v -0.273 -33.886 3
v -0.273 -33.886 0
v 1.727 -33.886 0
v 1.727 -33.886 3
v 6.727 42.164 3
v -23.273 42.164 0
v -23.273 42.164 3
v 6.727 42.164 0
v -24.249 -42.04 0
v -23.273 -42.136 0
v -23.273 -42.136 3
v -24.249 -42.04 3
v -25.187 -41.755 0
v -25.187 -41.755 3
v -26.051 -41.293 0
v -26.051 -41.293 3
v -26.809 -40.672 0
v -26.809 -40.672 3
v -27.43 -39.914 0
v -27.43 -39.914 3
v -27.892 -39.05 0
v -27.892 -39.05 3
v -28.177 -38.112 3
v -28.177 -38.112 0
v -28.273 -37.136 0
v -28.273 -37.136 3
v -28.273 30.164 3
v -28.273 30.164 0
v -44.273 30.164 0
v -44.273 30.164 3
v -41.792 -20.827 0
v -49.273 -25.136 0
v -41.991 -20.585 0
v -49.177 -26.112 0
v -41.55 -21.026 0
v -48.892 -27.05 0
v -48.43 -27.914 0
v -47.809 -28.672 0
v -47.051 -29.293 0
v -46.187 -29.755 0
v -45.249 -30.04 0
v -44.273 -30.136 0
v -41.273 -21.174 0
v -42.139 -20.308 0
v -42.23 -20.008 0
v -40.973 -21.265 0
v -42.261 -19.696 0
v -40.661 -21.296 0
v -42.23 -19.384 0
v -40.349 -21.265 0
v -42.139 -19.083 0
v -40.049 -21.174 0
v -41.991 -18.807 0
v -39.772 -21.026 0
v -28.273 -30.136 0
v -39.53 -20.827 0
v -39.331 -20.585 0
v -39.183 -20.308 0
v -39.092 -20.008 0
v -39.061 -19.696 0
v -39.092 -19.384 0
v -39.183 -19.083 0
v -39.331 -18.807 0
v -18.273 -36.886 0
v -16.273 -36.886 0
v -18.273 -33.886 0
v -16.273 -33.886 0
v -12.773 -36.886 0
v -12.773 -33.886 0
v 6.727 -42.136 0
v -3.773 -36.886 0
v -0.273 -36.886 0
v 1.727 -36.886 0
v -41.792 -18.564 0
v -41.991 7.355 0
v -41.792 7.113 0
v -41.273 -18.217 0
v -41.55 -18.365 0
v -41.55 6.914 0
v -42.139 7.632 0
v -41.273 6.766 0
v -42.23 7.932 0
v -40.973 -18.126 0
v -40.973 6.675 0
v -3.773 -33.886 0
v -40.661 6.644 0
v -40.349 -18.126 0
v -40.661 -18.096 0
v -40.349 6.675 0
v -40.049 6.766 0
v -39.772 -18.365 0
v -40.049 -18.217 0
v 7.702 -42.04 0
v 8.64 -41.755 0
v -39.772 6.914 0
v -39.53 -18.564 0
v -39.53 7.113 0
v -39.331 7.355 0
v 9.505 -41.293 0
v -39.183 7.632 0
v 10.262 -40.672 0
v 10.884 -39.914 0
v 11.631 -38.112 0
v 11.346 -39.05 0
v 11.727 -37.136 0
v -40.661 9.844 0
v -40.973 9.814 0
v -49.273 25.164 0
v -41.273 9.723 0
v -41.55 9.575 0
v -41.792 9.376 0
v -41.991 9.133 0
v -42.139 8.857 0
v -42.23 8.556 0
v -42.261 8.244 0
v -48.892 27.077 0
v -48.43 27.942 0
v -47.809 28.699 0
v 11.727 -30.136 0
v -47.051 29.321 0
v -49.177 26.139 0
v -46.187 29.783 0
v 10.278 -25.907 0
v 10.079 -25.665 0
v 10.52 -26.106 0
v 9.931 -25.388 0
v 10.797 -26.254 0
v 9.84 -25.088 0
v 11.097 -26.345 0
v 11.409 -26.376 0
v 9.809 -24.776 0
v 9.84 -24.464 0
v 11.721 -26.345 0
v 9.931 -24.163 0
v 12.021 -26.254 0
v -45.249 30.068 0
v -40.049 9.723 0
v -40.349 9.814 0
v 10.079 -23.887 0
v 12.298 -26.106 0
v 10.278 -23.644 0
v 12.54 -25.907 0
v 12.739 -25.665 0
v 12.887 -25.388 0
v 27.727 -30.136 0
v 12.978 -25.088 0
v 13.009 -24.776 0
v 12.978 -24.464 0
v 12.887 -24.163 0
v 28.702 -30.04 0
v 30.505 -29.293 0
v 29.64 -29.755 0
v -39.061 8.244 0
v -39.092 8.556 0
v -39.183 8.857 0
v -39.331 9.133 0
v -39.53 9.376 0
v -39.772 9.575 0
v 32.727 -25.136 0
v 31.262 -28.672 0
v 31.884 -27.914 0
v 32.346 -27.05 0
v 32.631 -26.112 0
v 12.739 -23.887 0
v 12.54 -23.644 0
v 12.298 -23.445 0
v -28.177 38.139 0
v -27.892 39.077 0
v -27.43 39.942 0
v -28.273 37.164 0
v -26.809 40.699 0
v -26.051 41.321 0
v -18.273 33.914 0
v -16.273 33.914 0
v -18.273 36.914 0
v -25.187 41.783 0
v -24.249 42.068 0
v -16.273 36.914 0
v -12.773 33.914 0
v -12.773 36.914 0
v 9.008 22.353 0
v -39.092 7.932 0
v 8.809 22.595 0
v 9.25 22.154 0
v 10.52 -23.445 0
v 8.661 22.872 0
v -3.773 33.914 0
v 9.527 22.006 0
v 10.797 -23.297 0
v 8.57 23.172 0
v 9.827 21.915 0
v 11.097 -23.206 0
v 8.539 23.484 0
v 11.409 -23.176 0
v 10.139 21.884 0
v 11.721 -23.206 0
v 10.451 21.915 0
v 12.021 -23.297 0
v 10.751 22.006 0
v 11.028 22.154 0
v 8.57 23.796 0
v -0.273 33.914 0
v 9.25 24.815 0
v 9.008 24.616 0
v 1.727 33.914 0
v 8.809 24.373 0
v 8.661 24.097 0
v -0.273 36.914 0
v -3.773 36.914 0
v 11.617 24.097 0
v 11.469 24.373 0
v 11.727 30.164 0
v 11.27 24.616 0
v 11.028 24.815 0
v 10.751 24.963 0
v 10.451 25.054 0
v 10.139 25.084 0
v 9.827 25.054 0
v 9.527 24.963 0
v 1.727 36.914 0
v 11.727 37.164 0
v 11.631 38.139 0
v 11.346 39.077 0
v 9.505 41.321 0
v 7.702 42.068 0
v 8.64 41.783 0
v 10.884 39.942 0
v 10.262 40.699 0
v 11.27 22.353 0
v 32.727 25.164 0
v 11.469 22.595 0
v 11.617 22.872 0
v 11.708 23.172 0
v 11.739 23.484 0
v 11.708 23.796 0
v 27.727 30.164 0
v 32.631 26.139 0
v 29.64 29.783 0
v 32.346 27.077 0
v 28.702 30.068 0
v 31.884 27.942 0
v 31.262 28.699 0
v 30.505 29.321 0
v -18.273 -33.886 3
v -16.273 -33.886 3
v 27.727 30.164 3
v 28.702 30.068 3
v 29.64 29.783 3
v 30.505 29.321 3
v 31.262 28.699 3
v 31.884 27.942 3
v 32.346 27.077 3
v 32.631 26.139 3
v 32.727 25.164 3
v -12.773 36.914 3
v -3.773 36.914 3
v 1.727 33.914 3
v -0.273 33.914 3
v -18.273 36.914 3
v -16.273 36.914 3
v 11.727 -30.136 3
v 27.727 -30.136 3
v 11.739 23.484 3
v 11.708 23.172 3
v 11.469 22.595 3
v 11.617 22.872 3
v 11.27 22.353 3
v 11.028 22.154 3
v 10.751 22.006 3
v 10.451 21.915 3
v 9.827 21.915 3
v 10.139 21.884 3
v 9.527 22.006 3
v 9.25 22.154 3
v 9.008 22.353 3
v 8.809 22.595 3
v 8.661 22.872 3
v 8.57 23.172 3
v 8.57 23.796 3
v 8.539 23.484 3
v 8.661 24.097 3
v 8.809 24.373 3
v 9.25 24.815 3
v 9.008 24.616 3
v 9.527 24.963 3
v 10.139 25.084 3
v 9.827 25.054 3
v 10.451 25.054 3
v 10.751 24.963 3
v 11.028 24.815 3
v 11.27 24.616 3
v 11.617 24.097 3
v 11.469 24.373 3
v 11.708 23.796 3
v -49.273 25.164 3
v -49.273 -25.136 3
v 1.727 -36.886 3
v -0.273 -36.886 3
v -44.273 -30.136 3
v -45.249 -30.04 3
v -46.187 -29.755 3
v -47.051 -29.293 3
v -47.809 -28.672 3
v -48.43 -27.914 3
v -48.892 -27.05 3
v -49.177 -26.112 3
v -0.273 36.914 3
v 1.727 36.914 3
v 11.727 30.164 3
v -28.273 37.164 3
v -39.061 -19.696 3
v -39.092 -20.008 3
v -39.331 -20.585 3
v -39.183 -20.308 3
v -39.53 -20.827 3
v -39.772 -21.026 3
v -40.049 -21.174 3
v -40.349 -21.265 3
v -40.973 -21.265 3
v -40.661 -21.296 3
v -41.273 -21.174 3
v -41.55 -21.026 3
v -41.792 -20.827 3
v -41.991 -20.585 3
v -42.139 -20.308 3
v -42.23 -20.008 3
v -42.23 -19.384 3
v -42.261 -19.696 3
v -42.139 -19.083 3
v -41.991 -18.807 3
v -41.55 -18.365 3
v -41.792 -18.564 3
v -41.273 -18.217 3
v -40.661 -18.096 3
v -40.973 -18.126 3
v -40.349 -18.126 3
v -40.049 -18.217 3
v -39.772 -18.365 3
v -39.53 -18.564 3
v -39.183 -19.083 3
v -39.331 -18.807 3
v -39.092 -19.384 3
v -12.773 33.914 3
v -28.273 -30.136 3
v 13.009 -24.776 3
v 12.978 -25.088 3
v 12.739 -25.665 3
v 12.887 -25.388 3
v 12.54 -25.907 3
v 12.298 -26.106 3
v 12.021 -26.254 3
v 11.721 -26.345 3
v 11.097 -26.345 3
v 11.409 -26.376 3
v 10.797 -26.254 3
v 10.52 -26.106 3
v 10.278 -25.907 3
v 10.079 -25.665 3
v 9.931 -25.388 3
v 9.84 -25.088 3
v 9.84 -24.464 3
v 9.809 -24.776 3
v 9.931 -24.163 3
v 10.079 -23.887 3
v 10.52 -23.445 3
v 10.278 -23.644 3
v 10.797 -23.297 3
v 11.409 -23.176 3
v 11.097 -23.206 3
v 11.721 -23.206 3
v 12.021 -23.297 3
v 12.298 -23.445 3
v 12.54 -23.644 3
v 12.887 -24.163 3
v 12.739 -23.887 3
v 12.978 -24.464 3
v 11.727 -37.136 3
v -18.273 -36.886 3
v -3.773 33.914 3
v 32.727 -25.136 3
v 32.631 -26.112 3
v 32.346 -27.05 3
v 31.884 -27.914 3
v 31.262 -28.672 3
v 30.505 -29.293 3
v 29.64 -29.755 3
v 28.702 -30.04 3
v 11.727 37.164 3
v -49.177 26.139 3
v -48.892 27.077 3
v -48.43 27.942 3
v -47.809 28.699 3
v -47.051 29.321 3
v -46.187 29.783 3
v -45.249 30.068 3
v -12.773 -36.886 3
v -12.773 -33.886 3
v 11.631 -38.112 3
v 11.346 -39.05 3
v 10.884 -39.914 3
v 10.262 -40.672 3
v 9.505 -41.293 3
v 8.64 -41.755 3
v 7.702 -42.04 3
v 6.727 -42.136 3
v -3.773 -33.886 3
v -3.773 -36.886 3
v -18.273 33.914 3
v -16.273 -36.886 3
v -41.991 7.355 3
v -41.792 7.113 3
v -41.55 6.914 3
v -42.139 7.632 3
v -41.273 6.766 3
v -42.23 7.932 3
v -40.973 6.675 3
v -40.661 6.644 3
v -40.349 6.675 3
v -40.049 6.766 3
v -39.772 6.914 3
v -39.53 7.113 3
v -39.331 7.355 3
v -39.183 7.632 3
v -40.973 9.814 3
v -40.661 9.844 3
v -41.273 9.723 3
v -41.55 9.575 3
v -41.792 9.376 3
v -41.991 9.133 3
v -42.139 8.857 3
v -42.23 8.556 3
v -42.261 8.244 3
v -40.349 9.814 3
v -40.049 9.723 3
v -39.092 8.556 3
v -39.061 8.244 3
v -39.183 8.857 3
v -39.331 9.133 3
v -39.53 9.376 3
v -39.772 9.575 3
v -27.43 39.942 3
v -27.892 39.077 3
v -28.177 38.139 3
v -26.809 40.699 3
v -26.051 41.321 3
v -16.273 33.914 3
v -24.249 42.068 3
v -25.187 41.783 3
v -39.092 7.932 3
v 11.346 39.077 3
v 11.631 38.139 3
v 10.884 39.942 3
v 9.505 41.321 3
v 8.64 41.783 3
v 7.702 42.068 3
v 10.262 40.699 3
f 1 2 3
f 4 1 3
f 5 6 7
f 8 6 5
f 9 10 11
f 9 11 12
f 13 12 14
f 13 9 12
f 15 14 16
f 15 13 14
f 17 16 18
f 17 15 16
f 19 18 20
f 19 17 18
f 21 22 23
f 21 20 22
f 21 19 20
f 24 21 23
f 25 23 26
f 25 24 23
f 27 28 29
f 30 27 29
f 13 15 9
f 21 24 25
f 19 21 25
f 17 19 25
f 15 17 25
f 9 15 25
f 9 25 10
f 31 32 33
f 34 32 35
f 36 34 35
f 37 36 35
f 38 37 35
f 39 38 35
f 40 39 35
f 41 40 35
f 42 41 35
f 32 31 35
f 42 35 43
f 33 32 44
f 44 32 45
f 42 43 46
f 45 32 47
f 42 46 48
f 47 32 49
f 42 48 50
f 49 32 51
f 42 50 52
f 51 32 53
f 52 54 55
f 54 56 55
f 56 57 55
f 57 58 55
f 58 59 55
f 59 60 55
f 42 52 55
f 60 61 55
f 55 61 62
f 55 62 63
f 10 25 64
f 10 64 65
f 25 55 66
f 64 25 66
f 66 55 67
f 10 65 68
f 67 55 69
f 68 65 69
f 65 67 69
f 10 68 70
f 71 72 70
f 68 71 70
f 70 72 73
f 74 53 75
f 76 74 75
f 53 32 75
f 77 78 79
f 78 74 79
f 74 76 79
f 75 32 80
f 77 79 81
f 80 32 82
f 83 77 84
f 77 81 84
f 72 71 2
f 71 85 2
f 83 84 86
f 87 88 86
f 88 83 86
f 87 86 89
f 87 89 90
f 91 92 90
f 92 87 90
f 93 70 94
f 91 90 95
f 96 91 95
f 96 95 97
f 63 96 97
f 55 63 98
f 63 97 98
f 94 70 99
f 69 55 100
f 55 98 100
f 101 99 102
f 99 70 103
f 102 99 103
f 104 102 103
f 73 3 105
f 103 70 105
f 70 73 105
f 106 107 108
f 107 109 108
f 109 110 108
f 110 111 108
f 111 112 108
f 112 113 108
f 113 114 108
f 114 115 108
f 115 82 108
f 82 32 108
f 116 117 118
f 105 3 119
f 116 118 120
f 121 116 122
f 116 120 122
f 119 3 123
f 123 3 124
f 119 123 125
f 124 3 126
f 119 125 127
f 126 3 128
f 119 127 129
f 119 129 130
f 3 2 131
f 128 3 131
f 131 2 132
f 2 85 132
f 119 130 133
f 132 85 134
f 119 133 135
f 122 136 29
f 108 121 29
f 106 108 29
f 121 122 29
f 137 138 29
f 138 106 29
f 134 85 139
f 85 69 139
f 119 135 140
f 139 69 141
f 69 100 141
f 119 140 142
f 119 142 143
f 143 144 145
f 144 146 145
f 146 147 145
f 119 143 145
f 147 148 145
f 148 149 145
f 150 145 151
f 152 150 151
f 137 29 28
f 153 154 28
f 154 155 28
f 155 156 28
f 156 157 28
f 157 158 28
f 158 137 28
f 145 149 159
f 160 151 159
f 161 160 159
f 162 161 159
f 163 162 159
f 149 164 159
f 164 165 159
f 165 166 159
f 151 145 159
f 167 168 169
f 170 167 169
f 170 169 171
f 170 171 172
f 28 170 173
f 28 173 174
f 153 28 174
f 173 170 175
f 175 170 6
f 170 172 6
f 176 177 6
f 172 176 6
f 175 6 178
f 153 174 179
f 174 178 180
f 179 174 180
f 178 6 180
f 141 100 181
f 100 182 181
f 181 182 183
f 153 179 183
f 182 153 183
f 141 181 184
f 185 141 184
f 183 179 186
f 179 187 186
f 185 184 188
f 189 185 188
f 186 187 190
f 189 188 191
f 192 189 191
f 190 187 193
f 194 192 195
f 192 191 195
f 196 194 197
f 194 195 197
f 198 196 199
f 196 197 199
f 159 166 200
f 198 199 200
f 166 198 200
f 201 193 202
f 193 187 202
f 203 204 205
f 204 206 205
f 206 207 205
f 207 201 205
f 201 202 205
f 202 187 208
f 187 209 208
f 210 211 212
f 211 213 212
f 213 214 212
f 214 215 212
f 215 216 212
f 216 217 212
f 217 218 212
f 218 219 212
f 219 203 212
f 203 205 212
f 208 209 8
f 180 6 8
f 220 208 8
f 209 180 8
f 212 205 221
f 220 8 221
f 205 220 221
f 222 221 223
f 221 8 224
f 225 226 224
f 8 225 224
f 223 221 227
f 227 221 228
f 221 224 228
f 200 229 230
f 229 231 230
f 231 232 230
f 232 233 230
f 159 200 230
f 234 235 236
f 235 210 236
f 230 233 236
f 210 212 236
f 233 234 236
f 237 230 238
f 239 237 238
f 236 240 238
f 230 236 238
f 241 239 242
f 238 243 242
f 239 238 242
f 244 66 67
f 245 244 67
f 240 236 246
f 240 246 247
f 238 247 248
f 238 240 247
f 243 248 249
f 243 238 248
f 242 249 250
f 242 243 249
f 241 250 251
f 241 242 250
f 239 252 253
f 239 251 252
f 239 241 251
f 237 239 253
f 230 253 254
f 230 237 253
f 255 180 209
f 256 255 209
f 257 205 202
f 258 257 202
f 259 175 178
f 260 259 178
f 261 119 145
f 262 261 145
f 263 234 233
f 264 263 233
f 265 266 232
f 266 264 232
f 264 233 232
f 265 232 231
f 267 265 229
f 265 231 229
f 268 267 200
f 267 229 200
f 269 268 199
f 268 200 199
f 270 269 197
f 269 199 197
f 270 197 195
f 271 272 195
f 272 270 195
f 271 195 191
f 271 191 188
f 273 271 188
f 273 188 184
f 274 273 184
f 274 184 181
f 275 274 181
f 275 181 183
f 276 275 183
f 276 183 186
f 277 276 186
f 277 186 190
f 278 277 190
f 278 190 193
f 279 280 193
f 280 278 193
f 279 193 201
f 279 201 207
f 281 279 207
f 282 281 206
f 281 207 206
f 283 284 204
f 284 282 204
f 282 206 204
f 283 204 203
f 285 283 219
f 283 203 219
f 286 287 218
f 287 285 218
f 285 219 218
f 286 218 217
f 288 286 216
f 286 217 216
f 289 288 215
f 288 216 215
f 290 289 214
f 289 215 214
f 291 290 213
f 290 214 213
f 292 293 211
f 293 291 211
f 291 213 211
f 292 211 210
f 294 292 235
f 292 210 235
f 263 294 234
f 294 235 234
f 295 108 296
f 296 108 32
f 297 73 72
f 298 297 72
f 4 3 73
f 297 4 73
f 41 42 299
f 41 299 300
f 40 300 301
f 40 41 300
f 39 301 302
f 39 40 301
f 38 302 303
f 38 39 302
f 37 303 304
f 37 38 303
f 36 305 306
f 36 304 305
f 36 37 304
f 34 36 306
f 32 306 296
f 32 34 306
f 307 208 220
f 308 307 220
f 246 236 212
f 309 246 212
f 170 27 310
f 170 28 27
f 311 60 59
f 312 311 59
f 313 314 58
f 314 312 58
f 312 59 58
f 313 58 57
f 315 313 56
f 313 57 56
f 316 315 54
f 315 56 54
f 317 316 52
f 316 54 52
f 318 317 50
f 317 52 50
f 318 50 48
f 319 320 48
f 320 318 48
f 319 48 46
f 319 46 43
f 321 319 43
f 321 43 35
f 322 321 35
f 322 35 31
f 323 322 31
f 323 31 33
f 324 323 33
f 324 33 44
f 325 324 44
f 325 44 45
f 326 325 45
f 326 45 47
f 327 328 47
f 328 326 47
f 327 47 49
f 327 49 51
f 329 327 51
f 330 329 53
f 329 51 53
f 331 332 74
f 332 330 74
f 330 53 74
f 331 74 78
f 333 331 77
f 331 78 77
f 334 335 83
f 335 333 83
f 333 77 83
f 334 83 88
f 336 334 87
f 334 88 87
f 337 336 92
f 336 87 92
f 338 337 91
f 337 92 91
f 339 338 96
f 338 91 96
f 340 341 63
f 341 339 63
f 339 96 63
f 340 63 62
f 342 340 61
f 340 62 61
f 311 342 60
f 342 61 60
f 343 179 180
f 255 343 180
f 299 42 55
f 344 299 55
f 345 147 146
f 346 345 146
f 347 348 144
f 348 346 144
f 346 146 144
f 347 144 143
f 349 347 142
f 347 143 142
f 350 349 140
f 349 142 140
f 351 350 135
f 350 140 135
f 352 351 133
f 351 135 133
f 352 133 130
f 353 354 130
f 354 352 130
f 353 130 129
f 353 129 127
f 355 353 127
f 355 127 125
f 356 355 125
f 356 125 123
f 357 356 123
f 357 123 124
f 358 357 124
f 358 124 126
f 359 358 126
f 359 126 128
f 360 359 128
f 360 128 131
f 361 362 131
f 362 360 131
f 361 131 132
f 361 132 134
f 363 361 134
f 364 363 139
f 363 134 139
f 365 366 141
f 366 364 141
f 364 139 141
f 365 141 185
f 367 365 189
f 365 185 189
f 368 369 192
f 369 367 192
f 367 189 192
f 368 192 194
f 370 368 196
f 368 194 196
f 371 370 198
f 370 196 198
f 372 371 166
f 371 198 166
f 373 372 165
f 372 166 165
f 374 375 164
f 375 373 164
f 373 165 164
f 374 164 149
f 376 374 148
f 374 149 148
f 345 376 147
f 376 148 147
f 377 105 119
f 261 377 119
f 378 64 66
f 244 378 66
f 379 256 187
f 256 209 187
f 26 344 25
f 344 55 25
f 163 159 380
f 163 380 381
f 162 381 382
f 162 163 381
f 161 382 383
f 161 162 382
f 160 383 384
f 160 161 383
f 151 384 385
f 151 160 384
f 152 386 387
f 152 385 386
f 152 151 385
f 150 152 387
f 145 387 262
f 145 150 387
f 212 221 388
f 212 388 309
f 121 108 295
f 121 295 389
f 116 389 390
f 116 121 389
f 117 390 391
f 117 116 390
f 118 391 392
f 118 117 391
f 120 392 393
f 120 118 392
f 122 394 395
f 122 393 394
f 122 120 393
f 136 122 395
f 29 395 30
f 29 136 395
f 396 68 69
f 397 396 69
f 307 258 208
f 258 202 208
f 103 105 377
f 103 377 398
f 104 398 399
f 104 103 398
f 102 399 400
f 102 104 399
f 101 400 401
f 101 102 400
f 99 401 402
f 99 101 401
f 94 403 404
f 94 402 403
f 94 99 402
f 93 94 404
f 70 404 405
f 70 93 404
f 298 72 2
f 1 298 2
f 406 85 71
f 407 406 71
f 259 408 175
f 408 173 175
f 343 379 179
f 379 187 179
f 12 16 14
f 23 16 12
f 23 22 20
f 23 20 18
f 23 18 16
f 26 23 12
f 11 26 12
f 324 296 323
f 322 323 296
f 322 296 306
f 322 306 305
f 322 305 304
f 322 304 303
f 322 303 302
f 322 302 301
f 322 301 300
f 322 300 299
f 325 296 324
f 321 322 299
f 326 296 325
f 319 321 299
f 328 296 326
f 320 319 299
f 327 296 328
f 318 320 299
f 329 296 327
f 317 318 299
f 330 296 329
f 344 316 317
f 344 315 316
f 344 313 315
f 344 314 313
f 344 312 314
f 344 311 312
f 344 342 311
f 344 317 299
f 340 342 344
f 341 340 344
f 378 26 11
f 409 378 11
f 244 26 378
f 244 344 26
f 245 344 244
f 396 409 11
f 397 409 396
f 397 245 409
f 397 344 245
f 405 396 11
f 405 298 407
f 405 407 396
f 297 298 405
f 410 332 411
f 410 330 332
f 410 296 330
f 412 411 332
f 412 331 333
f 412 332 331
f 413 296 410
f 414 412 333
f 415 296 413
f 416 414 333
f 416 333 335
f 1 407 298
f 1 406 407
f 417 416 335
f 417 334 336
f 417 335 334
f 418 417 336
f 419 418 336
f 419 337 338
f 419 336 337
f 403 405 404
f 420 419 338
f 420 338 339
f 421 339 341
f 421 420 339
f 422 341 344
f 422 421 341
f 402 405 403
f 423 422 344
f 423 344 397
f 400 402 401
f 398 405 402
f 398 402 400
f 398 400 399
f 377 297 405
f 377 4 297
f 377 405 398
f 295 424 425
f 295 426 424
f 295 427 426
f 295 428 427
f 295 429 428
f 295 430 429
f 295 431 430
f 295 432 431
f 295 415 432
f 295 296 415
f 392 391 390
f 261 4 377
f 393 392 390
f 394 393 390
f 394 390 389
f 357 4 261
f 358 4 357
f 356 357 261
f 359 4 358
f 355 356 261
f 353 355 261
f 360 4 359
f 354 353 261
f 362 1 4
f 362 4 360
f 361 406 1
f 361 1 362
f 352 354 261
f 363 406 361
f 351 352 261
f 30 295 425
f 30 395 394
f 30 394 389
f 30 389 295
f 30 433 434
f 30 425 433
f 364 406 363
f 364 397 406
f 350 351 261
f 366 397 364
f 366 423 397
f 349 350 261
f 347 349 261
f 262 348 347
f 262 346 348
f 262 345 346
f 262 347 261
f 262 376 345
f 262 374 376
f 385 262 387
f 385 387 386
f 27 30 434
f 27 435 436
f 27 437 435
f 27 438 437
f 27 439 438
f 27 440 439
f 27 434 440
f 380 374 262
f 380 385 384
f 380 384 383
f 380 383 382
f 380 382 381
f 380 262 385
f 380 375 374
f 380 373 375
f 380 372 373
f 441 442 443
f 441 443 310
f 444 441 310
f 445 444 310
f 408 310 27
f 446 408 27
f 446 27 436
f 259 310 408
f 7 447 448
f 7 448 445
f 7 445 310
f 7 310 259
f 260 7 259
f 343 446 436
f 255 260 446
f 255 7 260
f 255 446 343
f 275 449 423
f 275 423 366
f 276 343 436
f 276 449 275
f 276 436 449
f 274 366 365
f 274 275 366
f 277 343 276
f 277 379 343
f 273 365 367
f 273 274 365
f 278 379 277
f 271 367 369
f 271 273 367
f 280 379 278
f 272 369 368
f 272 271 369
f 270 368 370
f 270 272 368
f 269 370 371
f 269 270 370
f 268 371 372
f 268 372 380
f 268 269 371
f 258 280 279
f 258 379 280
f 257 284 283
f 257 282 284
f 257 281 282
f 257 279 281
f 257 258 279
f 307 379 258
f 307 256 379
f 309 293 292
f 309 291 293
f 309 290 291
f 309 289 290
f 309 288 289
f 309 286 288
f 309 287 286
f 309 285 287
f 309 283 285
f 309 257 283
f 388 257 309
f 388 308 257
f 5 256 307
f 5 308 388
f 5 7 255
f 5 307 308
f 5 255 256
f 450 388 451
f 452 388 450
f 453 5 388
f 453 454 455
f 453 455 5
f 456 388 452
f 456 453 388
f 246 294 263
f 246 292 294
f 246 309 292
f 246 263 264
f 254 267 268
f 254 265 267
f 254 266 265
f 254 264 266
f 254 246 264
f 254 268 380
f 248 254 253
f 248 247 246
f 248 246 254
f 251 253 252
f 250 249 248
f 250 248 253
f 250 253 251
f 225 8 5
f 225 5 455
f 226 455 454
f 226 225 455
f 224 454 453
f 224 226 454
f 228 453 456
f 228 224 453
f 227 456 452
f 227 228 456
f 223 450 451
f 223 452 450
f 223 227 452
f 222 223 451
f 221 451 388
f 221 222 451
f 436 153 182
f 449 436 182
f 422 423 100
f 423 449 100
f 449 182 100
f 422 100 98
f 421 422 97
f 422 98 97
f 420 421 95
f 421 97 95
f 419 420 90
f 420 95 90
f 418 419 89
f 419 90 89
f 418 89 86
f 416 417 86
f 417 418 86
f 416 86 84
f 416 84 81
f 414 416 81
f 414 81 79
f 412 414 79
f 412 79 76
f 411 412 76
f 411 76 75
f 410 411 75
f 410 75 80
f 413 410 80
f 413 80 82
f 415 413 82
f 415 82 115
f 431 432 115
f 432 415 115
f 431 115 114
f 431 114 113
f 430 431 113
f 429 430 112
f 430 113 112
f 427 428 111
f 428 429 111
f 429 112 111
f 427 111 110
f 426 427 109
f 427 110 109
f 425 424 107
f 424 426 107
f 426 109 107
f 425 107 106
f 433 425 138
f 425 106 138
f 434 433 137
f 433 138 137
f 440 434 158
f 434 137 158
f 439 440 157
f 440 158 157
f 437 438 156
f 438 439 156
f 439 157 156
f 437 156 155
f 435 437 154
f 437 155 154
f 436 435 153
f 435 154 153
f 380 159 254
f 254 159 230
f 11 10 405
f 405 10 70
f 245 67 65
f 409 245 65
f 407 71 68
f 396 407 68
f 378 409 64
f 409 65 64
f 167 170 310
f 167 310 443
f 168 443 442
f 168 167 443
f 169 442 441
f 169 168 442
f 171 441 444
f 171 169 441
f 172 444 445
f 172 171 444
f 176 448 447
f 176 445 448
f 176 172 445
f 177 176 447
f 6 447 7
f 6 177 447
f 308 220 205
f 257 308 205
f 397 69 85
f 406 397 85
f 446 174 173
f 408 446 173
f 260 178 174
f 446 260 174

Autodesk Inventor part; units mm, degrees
ref_plane "YZ Plane" through (0, 0, 0) normal (1, 0, 0) x (0, 1, 0)
ref_plane "XZ Plane" through (0, 0, 0) normal (0, 1, 0) x (-1, 0, 0)
ref_plane "XY Plane" through (0, 0, 0) normal (0, 0, 1) x (1, 0, 0)
sketch "Sketch1" plane through (0, 0, 0) normal (0, 0, 1) x (1, 0, 0)
  line L0 (-28.2731, 30.1639) -> (-44.2731, 30.1639) projected
  arc A0 (11.7269, 37.1639) -> (6.7269, 42.1639) centre (6.7269, 37.1639) ccw projected
  line L1 (-23.2731, 42.1639) -> (6.7269, 42.1639) projected
  arc A1 (-23.2731, 42.1639) -> (-28.2731, 37.1639) centre (-23.2731, 37.1639) ccw projected
  line L2 (-28.2731, 30.1639) -> (-28.2731, 37.1639) projected
  line L3 (-28.2731, 30.1639) -> (-44.2731, 30.1639) projected
  arc A2 (-44.2731, 30.1639) -> (-49.2731, 25.1639) centre (-44.2731, 25.1639) ccw projected
  line L4 (-49.2731, 25.1639) -> (-49.2731, -25.1361) projected
  arc A3 (-49.2731, -25.1361) -> (-44.2731, -30.1361) centre (-44.2731, -25.1361) ccw projected
  line L5 (-44.2731, -30.1361) -> (-28.2731, -30.1361) projected
  line L6 (-28.2731, -30.1361) -> (-28.2731, -37.1361) projected
  arc A4 (-28.2731, -37.1361) -> (-23.2731, -42.1361) centre (-23.2731, -37.1361) ccw projected
  line L7 (-23.2731, -42.1361) -> (6.7269, -42.1361) projected
  arc A5 (6.7269, -42.1361) -> (11.7269, -37.1361) centre (6.7269, -37.1361) ccw projected
  line L8 (11.7269, -37.1361) -> (11.7269, -30.1361) projected
  line L9 (11.7269, -30.1361) -> (27.7269, -30.1361) projected
  arc A6 (27.7269, -30.1361) -> (32.7269, -25.1361) centre (27.7269, -25.1361) ccw projected
  line L10 (32.7269, -25.1361) -> (32.7269, 25.1639) projected
  arc A7 (32.7269, 25.1639) -> (27.7269, 30.1639) centre (27.7269, 25.1639) ccw projected
  line L11 (27.7269, 30.1639) -> (11.7269, 30.1639) projected
  line L12 (11.7269, 37.1639) -> (11.7269, 30.1639) projected
  line L13 (1.7269, 36.9139) -> (1.7269, 33.9139) projected
  line L14 (1.7269, 33.9139) -> (-0.2731, 33.9139) projected
  line L15 (-0.2731, 33.9139) -> (-0.2731, 36.9139) projected
  line L16 (-0.2731, 36.9139) -> (1.7269, 36.9139) projected
  line L17 (-16.2731, 36.9139) -> (-16.2731, 33.9139) projected
  line L18 (-16.2731, 33.9139) -> (-18.2731, 33.9139) projected
  line L19 (-18.2731, 33.9139) -> (-18.2731, 36.9139) projected
  line L20 (-18.2731, 36.9139) -> (-16.2731, 36.9139) projected
  line L21 (-3.7731, 36.9139) -> (-3.7731, 33.9139) projected
  line L22 (-3.7731, 33.9139) -> (-12.7731, 33.9139) projected
  line L23 (-12.7731, 33.9139) -> (-12.7731, 36.9139) projected
  line L24 (-12.7731, 36.9139) -> (-3.7731, 36.9139) projected
  line L25 (1.7269, -33.8861) -> (1.7269, -36.8861) projected
  line L26 (1.7269, -36.8861) -> (-0.2731, -36.8861) projected
  line L27 (-0.2731, -36.8861) -> (-0.2731, -33.8861) projected
  line L28 (-0.2731, -33.8861) -> (1.7269, -33.8861) projected
  line L29 (-16.2731, -33.8861) -> (-16.2731, -36.8861) projected
  line L30 (-16.2731, -36.8861) -> (-18.2731, -36.8861) projected
  line L31 (-18.2731, -36.8861) -> (-18.2731, -33.8861) projected
  line L32 (-18.2731, -33.8861) -> (-16.2731, -33.8861) projected
  line L33 (-3.7731, -33.8861) -> (-3.7731, -36.8861) projected
  line L34 (-3.7731, -36.8861) -> (-12.7731, -36.8861) projected
  line L35 (-12.7731, -36.8861) -> (-12.7731, -33.8861) projected
  line L36 (-12.7731, -33.8861) -> (-3.7731, -33.8861) projected
  circle A8 centre (10.1389, 23.4843) radius 1.6 projected
  circle A9 centre (-40.6611, 8.2443) radius 1.6 projected
  circle A10 centre (-40.6611, -19.6957) radius 1.6 projected
  circle A11 centre (11.4089, -24.7757) radius 1.6 projected
  point P0 (0, 0)
extrude "Extrusion1" add sketch "Sketch1" along normal blind 3
properties part number "base2protopress"
